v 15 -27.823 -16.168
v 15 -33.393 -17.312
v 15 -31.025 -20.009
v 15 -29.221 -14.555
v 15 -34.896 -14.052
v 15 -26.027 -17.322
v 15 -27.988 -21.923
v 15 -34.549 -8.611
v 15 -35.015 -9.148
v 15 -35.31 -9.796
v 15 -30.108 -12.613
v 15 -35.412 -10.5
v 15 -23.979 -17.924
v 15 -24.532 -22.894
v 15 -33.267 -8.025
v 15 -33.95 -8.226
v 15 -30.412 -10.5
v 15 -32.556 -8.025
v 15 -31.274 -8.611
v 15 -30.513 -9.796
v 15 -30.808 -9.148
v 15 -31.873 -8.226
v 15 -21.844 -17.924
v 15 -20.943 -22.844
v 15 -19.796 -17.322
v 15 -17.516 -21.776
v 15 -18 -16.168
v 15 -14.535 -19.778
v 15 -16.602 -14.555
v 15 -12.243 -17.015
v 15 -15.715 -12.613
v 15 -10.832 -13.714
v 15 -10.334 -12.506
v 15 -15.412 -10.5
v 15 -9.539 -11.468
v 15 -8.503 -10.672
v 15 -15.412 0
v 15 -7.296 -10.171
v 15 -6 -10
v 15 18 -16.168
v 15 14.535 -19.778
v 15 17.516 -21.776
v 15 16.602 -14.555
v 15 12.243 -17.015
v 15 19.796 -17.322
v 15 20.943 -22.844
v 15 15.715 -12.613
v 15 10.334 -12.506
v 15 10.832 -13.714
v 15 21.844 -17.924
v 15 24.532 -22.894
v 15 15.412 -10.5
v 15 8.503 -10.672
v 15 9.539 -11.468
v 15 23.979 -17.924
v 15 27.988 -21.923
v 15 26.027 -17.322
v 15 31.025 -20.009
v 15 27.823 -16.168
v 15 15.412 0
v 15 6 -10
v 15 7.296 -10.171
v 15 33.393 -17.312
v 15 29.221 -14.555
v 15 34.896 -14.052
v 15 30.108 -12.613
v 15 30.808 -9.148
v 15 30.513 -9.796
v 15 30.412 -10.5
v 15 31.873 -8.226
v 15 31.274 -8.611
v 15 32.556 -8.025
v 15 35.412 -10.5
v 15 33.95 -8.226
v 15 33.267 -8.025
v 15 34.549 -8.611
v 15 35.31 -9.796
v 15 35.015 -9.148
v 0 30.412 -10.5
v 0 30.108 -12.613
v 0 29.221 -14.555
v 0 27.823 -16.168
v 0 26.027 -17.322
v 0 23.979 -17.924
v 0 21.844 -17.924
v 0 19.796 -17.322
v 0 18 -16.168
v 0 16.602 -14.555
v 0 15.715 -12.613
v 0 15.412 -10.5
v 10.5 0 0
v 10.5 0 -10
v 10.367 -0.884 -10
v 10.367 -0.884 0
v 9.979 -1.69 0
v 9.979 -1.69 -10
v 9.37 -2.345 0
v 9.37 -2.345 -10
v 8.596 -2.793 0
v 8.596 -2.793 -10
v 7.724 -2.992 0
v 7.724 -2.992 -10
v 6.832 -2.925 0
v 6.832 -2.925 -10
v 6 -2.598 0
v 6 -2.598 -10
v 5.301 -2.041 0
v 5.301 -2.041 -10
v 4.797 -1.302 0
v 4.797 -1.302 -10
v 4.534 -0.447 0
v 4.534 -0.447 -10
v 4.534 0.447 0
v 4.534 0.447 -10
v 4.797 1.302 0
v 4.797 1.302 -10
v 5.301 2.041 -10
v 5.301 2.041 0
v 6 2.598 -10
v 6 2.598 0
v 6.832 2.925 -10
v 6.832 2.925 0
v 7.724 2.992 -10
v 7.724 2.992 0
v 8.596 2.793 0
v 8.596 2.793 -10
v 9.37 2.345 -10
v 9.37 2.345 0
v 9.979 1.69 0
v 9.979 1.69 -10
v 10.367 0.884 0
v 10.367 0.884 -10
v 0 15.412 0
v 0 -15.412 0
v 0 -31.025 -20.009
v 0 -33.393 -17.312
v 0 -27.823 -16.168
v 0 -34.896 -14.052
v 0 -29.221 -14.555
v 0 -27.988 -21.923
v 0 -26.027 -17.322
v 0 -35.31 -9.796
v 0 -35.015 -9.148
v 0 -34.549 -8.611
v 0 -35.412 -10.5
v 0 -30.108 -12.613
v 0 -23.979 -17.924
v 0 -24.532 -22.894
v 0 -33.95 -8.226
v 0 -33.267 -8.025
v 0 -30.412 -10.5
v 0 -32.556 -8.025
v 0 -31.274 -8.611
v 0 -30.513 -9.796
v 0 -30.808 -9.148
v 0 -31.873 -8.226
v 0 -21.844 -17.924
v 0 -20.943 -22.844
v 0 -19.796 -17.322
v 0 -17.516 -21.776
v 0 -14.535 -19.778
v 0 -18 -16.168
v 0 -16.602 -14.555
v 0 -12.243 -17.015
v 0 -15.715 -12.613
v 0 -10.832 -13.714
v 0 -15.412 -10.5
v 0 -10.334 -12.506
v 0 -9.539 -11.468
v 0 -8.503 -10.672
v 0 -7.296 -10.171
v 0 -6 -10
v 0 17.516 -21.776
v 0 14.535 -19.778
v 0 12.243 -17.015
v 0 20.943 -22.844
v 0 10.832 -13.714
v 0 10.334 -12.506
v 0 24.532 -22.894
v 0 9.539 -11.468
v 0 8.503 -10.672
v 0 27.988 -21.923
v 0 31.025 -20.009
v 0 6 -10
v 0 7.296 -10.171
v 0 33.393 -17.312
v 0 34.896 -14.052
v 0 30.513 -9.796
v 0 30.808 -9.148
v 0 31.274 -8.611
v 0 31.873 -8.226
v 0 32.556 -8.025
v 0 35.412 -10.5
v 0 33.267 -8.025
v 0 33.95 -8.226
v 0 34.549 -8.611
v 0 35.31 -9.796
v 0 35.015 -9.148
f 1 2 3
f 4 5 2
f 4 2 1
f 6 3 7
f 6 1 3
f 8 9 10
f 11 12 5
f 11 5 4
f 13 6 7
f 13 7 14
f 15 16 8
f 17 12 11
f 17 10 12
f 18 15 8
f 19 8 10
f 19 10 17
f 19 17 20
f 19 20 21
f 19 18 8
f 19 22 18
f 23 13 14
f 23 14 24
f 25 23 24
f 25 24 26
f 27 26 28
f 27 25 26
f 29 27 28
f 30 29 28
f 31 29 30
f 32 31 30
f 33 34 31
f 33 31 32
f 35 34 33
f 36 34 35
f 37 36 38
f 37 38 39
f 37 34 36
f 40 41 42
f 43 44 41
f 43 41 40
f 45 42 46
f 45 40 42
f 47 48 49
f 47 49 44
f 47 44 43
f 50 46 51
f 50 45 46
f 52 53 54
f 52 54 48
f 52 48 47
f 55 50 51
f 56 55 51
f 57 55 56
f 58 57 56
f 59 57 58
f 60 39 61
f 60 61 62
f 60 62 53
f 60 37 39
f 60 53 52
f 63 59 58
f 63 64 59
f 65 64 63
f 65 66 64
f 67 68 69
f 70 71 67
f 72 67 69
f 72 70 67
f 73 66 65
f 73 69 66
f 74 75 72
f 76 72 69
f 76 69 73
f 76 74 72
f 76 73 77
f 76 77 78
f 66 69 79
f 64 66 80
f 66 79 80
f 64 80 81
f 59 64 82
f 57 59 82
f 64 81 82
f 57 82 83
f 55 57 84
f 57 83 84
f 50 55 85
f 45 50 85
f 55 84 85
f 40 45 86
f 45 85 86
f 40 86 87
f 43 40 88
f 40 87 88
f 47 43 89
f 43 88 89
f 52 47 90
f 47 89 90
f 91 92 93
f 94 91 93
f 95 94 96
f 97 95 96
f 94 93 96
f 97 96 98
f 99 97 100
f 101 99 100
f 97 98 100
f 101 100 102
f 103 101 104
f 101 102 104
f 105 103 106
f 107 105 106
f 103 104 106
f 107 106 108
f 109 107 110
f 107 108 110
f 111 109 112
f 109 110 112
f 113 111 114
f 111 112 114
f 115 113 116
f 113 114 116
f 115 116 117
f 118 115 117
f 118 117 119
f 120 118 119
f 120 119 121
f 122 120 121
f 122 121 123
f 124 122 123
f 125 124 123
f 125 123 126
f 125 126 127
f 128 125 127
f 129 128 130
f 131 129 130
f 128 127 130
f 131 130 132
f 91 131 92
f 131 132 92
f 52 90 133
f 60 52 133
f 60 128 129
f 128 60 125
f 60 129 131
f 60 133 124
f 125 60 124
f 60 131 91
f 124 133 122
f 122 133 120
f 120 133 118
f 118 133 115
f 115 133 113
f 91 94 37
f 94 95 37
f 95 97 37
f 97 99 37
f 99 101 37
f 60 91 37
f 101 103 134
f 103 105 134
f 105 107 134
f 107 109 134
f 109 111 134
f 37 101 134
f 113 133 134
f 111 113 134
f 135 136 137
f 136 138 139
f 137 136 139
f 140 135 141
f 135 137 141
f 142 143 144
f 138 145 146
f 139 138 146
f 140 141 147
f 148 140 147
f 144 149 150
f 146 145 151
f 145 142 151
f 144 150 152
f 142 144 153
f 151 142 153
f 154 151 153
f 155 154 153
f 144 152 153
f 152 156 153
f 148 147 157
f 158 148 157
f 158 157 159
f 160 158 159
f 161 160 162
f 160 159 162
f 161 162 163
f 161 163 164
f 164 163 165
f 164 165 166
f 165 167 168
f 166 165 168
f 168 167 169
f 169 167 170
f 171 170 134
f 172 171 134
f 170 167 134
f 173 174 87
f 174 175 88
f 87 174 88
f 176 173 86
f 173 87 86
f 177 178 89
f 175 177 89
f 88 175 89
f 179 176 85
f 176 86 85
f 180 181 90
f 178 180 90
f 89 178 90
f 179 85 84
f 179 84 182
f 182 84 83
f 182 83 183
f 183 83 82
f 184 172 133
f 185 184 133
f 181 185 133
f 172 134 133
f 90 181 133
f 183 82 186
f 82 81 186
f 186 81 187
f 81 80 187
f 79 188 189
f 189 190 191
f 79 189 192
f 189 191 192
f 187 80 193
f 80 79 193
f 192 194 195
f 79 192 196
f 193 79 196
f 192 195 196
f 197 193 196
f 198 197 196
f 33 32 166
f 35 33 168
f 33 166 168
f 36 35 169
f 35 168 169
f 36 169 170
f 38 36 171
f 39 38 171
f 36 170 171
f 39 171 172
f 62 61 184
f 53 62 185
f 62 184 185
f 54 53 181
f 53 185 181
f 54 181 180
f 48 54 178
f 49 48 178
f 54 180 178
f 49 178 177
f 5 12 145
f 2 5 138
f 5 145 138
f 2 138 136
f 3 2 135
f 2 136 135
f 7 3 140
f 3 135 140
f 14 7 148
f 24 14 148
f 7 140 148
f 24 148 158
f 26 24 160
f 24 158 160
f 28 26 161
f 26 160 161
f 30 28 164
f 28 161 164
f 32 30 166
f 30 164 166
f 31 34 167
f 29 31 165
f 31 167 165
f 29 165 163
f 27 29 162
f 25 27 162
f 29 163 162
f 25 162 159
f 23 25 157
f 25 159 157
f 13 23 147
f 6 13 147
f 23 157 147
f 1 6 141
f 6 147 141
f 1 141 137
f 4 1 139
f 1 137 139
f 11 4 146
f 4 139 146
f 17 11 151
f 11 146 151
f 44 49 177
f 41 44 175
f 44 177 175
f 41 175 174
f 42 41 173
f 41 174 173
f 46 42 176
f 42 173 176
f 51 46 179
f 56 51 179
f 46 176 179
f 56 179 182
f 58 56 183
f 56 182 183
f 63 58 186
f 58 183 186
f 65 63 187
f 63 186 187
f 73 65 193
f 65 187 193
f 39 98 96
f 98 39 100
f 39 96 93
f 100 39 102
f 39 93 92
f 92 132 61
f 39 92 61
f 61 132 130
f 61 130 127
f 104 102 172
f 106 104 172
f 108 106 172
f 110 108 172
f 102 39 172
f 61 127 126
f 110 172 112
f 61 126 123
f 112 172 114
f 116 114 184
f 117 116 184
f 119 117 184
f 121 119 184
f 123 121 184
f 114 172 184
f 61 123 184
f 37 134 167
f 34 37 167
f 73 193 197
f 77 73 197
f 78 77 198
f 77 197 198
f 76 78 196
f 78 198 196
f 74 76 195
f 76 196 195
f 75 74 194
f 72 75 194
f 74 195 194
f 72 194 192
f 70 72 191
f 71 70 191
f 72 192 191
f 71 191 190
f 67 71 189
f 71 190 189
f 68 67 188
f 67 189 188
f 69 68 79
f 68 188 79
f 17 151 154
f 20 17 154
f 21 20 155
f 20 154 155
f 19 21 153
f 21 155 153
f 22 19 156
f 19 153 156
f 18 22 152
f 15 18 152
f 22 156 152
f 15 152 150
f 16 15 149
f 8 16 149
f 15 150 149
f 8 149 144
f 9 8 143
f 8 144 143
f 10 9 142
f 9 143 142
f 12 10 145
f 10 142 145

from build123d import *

# Parameters (mm, degrees)
F1_DEPTH = 15
F2_R     = 3
F3_DEPTH = 10


with BuildPart() as f1:
    # F0 (on Right) → F1 (new body)
    with BuildSketch(Plane.YZ):
        with BuildLine():
            Line((15.411535, 0), (-15.411535, 0))
            Line((-15.411535, 0), (-15.411535, -10.5))
            ThreePointArc((-15.411535, -10.5), (-22.911535, -18), (-30.411535, -10.5))
            ThreePointArc((-30.411535, -10.5), (-32.911535, -8), (-35.411535, -10.5))
            ThreePointArc((-35.411535, -10.5), (-24.532361, -22.894471), (-10.831867, -13.714286))
            ThreePointArc((-10.831867, -13.714286), (-9.047247, -11.035875), (-6, -10))
            Line((-6, -10), (6, -10))
            ThreePointArc((6, -10), (9.047247, -11.035875), (10.831867, -13.714286))
            ThreePointArc((10.831867, -13.714286), (24.532361, -22.894471), (35.411535, -10.5))
            ThreePointArc((35.411535, -10.5), (32.911535, -8), (30.411535, -10.5))
            ThreePointArc((30.411535, -10.5), (22.911535, -18), (15.411535, -10.5))
            Line((15.411535, -10.5), (15.411535, 0))
        make_face()
    extrude(amount=F1_DEPTH)

    # F2 (on face) → F3 (cut, through all)
    with BuildSketch(Plane(origin=(0, 0, -10), x_dir=(1, 0, 0), z_dir=(0, 0, -1))):
        with Locations((7.5, 0)):
            Circle(F2_R)
    extrude(amount=-F3_DEPTH, mode=Mode.SUBTRACT)


solid = f1.part
